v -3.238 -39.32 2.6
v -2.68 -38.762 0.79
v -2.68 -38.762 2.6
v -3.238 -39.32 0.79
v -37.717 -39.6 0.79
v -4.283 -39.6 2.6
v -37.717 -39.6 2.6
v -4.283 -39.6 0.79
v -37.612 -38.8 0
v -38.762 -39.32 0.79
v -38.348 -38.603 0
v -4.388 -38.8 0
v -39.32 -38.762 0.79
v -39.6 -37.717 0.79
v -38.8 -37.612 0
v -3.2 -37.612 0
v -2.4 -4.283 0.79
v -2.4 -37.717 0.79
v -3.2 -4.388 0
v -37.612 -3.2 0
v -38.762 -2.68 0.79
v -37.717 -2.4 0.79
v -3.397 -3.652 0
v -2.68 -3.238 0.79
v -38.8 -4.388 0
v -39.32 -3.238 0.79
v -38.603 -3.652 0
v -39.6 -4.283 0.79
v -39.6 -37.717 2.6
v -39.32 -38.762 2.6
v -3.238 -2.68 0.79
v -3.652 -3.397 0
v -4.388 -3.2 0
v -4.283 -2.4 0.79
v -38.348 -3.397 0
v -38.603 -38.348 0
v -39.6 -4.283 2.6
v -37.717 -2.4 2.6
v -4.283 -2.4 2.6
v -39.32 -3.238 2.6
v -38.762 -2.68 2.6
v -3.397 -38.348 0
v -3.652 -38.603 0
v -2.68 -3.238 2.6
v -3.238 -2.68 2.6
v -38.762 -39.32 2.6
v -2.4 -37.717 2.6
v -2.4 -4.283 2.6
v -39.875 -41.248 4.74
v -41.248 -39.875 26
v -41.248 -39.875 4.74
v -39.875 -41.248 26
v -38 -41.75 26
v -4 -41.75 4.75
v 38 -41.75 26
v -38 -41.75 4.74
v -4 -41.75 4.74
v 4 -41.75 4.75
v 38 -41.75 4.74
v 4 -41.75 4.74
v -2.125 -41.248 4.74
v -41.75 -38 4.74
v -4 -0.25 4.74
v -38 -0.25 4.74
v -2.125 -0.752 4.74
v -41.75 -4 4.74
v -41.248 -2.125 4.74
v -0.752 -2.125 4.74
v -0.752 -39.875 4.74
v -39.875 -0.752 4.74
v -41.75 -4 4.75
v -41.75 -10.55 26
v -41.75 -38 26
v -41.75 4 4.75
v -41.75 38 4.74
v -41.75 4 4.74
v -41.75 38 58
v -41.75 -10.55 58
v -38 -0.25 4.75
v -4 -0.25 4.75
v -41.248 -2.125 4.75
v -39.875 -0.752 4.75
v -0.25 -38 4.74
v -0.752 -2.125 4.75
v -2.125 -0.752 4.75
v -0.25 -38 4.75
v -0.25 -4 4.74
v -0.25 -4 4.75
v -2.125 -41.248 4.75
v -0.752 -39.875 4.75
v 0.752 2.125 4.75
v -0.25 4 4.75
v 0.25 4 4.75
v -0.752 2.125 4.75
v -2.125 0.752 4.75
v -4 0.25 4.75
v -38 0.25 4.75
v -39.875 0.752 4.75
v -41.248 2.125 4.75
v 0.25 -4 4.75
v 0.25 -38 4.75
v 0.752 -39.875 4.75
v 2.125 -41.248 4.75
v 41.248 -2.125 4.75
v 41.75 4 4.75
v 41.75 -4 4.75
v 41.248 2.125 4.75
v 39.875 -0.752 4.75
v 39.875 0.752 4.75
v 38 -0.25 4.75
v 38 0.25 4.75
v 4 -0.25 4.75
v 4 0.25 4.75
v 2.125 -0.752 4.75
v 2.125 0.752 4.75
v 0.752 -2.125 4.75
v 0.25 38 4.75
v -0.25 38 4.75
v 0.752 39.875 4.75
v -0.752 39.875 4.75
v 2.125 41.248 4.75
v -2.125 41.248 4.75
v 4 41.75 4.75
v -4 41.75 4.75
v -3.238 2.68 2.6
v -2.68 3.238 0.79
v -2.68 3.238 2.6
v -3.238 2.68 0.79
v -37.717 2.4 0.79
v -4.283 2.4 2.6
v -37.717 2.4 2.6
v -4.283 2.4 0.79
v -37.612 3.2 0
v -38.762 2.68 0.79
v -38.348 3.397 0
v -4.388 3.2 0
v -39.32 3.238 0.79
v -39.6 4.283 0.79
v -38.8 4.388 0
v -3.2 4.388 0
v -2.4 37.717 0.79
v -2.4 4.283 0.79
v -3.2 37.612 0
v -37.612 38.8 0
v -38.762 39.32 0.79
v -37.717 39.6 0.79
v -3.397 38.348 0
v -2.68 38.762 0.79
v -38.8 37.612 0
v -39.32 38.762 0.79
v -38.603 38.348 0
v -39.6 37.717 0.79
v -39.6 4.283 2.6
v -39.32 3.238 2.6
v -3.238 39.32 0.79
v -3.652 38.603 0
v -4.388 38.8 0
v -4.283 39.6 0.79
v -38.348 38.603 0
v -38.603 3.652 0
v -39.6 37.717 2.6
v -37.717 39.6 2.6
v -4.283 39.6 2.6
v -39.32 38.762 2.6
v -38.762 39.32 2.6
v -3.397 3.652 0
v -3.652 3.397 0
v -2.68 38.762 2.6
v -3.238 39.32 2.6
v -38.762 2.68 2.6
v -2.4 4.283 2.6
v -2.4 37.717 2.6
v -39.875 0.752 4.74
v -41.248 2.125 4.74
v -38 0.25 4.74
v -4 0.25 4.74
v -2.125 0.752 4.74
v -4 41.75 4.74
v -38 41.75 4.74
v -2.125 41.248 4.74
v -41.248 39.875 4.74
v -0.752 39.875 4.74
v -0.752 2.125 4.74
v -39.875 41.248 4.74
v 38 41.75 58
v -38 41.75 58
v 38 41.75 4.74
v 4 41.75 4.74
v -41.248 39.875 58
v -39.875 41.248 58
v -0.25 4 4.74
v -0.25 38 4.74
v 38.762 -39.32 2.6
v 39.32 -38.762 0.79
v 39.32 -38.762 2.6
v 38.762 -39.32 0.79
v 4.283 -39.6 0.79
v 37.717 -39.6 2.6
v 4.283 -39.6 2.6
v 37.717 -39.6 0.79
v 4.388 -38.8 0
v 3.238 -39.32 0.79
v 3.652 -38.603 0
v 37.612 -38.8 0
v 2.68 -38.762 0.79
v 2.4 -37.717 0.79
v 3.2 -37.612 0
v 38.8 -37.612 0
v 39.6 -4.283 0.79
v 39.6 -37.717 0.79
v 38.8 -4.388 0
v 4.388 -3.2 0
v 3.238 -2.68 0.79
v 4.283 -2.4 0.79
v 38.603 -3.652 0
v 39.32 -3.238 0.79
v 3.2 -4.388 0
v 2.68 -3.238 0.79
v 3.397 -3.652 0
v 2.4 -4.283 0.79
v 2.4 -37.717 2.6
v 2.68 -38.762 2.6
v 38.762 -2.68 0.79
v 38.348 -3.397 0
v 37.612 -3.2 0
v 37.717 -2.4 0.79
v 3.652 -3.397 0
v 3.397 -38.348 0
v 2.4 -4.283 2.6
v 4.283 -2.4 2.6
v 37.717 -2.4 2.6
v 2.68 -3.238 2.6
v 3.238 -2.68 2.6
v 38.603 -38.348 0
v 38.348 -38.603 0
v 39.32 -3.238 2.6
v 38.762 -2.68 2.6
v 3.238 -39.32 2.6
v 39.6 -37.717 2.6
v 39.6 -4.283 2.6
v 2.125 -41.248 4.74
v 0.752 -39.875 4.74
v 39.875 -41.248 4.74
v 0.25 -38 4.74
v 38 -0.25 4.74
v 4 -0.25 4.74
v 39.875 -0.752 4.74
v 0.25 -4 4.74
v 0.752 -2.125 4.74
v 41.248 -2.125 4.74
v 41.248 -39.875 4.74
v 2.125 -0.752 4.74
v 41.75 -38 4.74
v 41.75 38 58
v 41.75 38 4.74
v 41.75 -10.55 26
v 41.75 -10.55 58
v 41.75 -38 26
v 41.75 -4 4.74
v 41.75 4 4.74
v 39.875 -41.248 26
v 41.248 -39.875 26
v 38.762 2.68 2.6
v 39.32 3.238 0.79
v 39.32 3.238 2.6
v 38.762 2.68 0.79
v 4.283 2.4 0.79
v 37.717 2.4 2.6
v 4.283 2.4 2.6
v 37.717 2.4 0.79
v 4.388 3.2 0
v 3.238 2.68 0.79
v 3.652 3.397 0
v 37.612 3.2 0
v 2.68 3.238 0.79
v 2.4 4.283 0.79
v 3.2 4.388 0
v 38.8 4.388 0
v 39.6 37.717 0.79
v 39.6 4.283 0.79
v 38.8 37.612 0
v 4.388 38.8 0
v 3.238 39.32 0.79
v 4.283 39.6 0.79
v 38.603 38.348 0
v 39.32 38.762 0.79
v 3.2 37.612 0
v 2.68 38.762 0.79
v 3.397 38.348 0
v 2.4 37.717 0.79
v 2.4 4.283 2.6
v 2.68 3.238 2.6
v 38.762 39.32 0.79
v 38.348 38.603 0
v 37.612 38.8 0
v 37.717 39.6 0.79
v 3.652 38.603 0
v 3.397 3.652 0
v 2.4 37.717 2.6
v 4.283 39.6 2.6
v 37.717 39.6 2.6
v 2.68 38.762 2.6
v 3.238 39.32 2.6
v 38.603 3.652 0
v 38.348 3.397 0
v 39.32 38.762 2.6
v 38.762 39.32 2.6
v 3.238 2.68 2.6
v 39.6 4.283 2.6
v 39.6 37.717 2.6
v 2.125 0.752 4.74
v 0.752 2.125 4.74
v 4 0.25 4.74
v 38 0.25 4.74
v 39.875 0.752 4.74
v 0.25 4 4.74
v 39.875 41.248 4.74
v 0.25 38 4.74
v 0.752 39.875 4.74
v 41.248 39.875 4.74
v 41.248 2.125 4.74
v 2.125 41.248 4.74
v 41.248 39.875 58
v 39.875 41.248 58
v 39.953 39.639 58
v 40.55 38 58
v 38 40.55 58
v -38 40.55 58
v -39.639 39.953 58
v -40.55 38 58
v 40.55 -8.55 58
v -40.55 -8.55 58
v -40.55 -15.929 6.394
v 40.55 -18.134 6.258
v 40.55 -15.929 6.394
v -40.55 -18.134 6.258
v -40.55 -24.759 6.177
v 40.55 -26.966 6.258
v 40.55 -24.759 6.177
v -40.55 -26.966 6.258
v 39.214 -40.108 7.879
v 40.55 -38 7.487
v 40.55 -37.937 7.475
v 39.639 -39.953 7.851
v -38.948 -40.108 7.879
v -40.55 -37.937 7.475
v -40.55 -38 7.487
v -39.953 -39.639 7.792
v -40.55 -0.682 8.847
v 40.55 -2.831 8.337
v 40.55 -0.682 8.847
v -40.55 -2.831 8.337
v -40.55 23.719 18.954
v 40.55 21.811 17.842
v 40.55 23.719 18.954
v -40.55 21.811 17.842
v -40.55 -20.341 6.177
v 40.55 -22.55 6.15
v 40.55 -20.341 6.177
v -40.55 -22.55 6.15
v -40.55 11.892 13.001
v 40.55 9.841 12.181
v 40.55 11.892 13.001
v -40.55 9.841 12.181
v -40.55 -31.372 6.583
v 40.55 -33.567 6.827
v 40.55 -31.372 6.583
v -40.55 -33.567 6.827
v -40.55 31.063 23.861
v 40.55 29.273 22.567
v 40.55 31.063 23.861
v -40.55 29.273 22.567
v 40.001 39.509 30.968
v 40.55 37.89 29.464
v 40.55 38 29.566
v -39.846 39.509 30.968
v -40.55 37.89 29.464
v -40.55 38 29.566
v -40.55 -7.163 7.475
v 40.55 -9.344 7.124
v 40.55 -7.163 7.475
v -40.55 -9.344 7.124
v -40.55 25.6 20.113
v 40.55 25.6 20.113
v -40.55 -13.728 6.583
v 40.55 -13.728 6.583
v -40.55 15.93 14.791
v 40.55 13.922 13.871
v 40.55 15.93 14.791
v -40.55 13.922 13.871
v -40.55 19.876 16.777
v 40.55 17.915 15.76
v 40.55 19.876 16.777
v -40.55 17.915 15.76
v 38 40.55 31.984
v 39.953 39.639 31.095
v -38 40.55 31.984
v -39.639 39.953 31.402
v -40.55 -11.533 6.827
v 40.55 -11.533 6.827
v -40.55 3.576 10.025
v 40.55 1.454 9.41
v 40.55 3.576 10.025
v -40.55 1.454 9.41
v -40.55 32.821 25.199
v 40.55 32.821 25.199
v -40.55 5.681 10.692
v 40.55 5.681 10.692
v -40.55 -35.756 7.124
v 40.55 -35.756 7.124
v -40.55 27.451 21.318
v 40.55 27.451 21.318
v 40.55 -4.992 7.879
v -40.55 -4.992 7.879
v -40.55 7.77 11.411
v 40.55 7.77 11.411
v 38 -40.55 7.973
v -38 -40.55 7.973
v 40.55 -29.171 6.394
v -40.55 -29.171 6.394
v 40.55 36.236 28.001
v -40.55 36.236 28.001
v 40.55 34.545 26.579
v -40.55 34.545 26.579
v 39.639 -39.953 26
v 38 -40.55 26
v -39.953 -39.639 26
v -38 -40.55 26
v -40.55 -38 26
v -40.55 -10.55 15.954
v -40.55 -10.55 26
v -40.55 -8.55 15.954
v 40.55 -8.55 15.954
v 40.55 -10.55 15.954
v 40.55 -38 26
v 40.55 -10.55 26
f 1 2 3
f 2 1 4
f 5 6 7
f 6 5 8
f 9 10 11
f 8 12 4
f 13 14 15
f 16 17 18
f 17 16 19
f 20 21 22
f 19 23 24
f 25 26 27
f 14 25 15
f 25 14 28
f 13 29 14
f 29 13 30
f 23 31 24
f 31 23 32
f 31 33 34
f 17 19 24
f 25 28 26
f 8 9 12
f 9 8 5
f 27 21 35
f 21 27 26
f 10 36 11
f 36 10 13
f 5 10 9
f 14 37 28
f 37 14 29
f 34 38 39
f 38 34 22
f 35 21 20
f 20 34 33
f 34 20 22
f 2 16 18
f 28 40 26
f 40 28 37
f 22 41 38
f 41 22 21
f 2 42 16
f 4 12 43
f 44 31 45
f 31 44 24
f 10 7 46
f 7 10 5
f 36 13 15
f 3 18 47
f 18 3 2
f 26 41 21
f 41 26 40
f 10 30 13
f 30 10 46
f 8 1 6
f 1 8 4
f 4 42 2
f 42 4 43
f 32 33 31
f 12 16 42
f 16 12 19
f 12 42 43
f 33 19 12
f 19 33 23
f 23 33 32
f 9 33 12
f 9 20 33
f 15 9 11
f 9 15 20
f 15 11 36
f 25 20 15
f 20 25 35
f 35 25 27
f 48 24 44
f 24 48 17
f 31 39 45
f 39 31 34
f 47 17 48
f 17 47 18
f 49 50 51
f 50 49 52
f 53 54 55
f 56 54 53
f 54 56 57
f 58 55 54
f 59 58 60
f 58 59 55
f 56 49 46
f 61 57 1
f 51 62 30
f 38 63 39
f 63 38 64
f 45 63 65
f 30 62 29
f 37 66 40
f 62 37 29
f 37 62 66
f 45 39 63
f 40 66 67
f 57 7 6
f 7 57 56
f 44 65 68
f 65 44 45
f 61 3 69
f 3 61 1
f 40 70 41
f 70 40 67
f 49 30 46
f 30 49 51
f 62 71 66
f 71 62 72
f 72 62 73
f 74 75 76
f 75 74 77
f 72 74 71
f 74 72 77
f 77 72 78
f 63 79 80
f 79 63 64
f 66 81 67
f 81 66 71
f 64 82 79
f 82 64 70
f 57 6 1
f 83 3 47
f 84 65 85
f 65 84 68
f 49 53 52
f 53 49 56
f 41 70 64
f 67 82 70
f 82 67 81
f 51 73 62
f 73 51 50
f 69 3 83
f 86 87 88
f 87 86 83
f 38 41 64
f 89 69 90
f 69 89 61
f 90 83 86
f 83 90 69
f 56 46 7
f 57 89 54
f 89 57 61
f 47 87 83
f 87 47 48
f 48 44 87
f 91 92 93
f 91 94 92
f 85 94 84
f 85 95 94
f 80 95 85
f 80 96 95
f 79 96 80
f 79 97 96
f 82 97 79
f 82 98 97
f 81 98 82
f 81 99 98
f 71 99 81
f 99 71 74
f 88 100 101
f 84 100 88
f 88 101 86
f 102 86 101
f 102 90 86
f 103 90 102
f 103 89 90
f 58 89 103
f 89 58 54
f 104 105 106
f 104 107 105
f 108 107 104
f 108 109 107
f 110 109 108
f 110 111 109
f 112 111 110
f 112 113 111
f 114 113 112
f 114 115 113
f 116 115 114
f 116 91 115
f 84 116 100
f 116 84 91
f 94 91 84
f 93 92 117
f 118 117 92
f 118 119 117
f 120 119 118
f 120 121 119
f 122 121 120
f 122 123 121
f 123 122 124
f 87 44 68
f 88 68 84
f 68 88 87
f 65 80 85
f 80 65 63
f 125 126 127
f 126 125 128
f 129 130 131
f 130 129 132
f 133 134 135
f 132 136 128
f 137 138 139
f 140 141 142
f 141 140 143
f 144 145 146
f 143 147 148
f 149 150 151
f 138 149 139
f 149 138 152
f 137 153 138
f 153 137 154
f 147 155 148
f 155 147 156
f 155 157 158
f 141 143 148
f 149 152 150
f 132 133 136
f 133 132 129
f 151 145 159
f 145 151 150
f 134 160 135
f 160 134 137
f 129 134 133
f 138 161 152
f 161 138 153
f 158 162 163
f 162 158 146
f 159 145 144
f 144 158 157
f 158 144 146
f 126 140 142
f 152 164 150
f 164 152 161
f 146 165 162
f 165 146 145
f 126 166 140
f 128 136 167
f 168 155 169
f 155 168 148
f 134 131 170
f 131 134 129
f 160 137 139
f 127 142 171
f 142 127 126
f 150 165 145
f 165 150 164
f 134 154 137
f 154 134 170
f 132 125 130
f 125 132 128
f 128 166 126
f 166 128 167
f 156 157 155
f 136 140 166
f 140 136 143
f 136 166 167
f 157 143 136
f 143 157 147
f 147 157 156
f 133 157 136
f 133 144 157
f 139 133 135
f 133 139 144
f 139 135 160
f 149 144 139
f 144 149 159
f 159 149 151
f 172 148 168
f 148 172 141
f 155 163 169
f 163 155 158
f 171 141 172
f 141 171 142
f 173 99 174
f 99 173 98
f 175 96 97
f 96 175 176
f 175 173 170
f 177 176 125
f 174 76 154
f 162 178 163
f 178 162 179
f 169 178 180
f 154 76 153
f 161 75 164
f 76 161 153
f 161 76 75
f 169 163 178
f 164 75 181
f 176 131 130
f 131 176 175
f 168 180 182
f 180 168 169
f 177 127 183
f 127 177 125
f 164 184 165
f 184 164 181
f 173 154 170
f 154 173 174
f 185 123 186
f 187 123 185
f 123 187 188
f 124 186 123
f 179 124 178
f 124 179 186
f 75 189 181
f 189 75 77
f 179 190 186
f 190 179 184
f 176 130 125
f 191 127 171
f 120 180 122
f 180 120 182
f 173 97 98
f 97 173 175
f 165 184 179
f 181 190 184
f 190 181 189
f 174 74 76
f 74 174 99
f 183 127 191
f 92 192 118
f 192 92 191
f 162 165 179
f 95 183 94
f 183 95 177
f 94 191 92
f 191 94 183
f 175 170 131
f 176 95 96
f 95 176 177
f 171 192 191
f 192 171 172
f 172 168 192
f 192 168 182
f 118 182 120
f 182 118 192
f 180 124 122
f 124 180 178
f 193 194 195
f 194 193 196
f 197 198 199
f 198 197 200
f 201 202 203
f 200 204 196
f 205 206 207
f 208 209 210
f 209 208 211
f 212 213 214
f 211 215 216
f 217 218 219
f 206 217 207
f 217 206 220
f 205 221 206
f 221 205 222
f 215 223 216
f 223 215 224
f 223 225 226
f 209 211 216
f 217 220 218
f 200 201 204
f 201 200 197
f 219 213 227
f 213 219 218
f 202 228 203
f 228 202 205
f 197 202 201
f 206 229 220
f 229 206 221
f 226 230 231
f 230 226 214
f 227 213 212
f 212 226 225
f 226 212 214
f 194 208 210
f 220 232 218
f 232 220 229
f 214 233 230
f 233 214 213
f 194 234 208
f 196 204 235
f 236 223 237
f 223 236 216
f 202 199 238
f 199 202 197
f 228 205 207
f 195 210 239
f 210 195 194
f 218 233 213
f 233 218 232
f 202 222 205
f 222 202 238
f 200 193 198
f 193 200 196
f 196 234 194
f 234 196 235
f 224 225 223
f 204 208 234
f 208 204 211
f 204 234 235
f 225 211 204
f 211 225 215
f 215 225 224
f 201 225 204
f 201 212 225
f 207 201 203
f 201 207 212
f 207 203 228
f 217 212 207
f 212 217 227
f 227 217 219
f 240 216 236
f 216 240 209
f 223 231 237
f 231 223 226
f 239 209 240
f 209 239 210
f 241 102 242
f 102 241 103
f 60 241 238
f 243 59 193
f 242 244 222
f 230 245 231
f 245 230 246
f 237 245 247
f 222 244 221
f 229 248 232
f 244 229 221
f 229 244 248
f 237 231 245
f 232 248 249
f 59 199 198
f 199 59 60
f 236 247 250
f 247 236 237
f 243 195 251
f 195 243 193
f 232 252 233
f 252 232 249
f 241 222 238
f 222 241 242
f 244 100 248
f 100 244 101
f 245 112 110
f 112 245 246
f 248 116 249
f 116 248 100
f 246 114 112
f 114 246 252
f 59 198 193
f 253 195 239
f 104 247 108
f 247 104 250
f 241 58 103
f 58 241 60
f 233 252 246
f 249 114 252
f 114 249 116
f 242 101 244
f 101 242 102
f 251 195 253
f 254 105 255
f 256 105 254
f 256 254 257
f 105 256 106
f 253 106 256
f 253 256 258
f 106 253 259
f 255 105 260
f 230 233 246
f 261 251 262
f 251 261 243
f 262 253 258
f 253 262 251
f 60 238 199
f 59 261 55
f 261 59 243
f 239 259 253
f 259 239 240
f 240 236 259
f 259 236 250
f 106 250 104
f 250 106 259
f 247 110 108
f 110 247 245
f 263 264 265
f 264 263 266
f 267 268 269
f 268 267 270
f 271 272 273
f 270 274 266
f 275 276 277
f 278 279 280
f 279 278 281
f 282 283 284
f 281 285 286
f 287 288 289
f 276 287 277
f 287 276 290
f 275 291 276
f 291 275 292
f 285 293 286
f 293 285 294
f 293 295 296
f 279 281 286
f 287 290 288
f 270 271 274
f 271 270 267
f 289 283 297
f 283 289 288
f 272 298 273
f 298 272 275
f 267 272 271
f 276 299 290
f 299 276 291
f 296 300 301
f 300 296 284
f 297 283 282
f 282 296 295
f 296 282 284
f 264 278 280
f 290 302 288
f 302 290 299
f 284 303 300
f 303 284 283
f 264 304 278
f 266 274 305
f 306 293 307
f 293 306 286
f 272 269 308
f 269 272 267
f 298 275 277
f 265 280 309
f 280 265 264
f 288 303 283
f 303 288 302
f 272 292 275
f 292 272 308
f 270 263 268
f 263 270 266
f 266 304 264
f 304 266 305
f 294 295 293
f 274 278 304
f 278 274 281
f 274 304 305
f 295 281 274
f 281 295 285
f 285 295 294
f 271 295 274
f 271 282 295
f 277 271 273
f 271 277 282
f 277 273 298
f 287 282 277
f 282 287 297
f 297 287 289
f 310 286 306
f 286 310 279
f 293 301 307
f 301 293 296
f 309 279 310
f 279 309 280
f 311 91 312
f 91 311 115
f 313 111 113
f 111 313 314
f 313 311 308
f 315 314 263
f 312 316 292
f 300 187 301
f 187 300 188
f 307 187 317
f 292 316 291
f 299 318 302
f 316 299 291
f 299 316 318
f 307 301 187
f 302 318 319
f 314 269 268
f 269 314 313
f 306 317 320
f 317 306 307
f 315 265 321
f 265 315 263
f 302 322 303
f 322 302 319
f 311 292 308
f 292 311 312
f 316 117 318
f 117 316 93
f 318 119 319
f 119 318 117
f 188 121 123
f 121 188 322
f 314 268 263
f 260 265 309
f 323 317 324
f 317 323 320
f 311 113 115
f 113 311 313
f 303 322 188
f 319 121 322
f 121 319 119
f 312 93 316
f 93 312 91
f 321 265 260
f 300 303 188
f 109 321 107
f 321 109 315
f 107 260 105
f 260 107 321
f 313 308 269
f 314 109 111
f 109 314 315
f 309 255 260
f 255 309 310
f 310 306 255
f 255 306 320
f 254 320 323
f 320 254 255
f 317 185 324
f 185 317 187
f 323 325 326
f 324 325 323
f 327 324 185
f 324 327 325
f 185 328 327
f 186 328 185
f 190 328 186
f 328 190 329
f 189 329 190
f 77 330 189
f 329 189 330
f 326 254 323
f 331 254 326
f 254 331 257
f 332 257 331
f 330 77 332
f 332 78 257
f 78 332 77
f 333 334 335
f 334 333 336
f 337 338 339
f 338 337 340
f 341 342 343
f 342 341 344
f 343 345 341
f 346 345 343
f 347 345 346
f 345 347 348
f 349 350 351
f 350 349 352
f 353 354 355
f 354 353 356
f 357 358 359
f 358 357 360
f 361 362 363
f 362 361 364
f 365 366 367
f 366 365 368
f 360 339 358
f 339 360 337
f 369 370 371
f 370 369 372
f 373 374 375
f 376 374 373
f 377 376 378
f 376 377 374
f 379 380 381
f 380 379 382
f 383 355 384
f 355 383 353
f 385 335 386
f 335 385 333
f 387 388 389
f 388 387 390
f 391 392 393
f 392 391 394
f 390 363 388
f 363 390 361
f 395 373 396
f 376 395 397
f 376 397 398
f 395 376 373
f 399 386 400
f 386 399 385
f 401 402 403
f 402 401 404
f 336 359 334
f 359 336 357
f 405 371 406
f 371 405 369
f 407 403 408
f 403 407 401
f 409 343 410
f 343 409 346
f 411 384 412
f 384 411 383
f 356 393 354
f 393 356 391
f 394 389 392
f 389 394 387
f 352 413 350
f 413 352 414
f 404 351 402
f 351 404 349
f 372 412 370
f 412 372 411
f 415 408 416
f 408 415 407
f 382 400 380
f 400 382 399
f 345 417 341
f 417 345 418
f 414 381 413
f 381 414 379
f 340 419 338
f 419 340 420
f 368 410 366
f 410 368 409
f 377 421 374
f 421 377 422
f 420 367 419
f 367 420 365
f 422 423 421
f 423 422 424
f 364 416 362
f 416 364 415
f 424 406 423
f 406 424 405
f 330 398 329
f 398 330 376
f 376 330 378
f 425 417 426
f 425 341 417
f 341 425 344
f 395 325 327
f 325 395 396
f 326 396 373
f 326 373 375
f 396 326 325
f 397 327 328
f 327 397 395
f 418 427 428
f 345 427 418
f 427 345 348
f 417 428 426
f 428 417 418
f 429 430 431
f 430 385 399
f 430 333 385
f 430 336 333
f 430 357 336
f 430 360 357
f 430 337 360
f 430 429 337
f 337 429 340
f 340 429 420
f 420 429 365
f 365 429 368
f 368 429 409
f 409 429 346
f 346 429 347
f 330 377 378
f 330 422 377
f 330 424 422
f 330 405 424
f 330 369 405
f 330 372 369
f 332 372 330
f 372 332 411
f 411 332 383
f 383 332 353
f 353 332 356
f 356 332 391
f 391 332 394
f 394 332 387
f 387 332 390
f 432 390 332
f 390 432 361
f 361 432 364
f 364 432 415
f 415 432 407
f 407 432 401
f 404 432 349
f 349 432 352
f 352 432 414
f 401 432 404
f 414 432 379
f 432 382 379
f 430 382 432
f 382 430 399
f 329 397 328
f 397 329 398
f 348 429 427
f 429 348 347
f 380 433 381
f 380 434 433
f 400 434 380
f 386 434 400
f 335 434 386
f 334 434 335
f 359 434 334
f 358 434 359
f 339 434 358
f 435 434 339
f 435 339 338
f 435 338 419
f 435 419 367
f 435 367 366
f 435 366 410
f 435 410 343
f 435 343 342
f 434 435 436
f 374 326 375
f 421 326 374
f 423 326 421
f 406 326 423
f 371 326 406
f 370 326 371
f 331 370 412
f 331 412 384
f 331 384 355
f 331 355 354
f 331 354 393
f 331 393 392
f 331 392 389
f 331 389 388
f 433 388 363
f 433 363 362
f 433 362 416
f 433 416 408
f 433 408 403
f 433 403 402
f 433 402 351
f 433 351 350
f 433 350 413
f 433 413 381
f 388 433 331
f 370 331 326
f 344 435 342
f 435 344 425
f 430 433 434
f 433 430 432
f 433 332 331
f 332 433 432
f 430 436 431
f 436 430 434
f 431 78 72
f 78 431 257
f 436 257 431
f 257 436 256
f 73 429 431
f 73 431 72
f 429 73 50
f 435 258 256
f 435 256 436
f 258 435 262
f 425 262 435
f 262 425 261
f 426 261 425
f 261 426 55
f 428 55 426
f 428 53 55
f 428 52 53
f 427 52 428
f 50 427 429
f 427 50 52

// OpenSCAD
// file: ../lib/vessel.scad
// SPDX-License-Identifier: MIT
// Copyright (c) 2026 Aaron Cupp
//
// vessel.scad — parametric collar cups for bottles, cans, and pen-form tools.
//
// A collar cup is a solid Gridfinity block with cylindrical bores sunk into it.
// It LOCATES a vessel; it does not clamp one. That distinction is the whole
// design: a collar that grips harder than the bin weighs comes out of the
// baseplate with the bottle when you grab it one-handed. Clearance, not
// interference — CLR is per-diameter, not per-side.
//
// Capture depth is roughly a third of the vessel's height. Enough to resist a
// knock (this bench sits under a 180 W fume-extractor intake), not so much that
// you're fishing the bottle out.
//
//   collar_cup(nx, ny, vessel_d, capture_h, …)   — one centred bore
//   collar_cup_multi(nx, ny, bores, capture_h, …) — bores = [[x, y, d], …]
//
// Cord slot: pen-form tools that stand in a cup are usually corded (the HARDELL
// rotary tool takes a barrel jack). Without a slot the lead drapes over the rim
// and levers the tool sideways. `cord_w > 0` cuts a channel from the bore out
// through the wall, open to the top.

include <gridfinity.scad>

CLR      = 1.0;   // bore = vessel_d + CLR. Loose on purpose — see above.
MIN_WALL = 1.2;   // minimum material between two bores, and bore to outer face

// ---- geometry guards ----
// Overlapping bores and bores that break out through the side wall both still
// render as perfectly watertight, 2-manifold meshes — CI cannot tell you the
// part is wrong, only that it is closed. These asserts encode the intent that
// the mesh check can't. Cheap, and they fire at render time rather than on the
// printer.
function _pair_gaps(bores, clr) = [
    for (i = [0 : len(bores)-1], j = [0 : len(bores)-1]) if (i < j)
        norm([bores[i][0]-bores[j][0], bores[i][1]-bores[j][1]])
        - (bores[i][2]+clr)/2 - (bores[j][2]+clr)/2
];
function _edge_gaps(bores, clr, W, D) = [
    for (b = bores) min(W/2 - abs(b[0]) - (b[2]+clr)/2,
                        D/2 - abs(b[1]) - (b[2]+clr)/2)
];

// Multi-bore block. Bores are [x, y, diameter] in mm, relative to the block centre.
module collar_cup_multi(nx, ny, bores, capture_h, floor = 1.4, clr = CLR,
                        cord_w = 0, cord_at = 0, min_wall = MIN_WALL) {
    h = BIN_BASE_H + floor + capture_h;
    e = 0.1;
    W = nx*GF - 0.5; D = ny*GF - 0.5;
    _pg = _pair_gaps(bores, clr);
    _eg = _edge_gaps(bores, clr, W, D);
    assert(len(_pg) == 0 || min(_pg) >= min_wall,
           "collar_cup: bores are too close — they would merge into one pocket");
    assert(min(_eg) >= min_wall,
           "collar_cup: a bore breaches the outer wall — block needs more units");
    difference() {
        bin_blank(nx, ny, h);
        for (b = bores)
            translate([b[0], b[1], BIN_BASE_H + floor])
                cylinder(d = b[2] + clr, h = capture_h + e, $fn = 96);
        // Cord channel: from the first bore outward through the +X wall, open to
        // the rim so the lead drops in from above rather than threading.
        if (cord_w > 0)
            translate([bores[0][0], bores[0][1] - cord_w/2, BIN_BASE_H + floor + cord_at])
                cube([nx*GF, cord_w, h]);
    }
}

// Single centred bore — the common case.
module collar_cup(nx, ny, vessel_d, capture_h, floor = 1.4, clr = CLR,
                  cord_w = 0, cord_at = 0, min_wall = MIN_WALL) {
    collar_cup_multi(nx, ny, [[0, 0, vessel_d]], capture_h, floor, clr,
                     cord_w, cord_at, min_wall);
}

// Evenly spaced row of same-depth bores along X — for a rank of aerosol cans.
// Returns geometry, not a list; pass the diameters and it lays them out on the
// block's centre line.
module collar_cup_row(nx, ny, diameters, capture_h, floor = 1.4, clr = CLR,
                      min_wall = MIN_WALL) {
    n = len(diameters);
    pitch = nx * GF / n;
    collar_cup_multi(nx, ny,
        [for (i = [0 : n-1]) [(i - (n-1)/2) * pitch, 0, diameters[i]]],
        capture_h, floor, clr, 0, 0, min_wall);
}
// file: cleaning_station_common.scad
// cleaning_station_common.scad — shared parameters for the bench cleaning station.
//
// The IPA / contact-cleaner corner of the electronics repair bench. Everything
// here is measured off the actual items with calipers; nothing is a nominal from
// a product page. Diameters carry a per-diameter clearance (lib/vessel.scad CLR),
// not per-side.
//
// This corner sits under a fume-extractor intake, which drives two decisions:
//   * Cups CAPTURE the vessel rather than clamp it — a collar that grips harder
//     than the bin weighs lifts out of the baseplate with the bottle.
//   * Bins stay as low as the job allows. Capture velocity is decided in the
//     first six inches, and a wall of tall bins in front of the hood costs it.
//
// The aerosols are FLAMMABLE and this bench has a 400 °C iron on it. These cups
// are for working cans only; bulk stock belongs away from the hood entirely.
//
// SPDX-License-Identifier: CC-BY-NC-SA-4.0
// Copyright (c) 2026 Aaron Cupp

include <../lib/vessel.scad>

// ---- measured diameters (mm) ----
// DeoxIT bore: taken from the PART, not from a can measurement.
//
// The 2026-08-20 print had three bores — 57.00 / 55.20 / 52.75. The 57.00 fits a
// DeoxIT; 55.20 barely does; 52.75 holds nothing. So 57.00 is a validated bore,
// which beats re-deriving it from a can diameter plus a clearance guess. D5, F5
// and G5 are the same can, so one bore serves all three.
BORE_DEOXIT = 57.00;   // ✅ proven by the printed part

// Freeze spray is a DIFFERENT, LARGER can — 13 mm wider than a DeoxIT, which is
// why it never fitted a shared block.
D_FREEZE_SPRAY = 69.00;   // ✅ measured 2026-08-20 (was 56.00, badly wrong)
FREEZE_CLR     = 2.0;     // [1:0.5:4] -> 71.00 bore
FREEZE_MEASURED = true;

D_DISPENSER    = 53.50;   // 200 ml push-down alcohol pump, square base across flats
D_FLOOD_BOTTLE = 75.50;

// DeoxIT D100 / F100 / G100 concentrate droppers — bare bottles, out of their
// kit boxes. The boxes are a full 2×1 EACH; the three bare bottles share one.
// NOT ROUND — 39 × 20 is a flattened cross-section, not a diameter and a height.
D_DROPPER_L = 39.00;   // measured 2026-08-20, long axis of the footprint
D_DROPPER_W = 20.00;   // measured, short axis
DROPPER_CLR = 1.00;    // per dimension, matching the CLR convention
CAP_DROPPER = 26;      // [8:1:40] capture depth. ⚠️ bottle HEIGHT is unmeasured —
                       //   39 turned out to be a footprint, so the height nobody
                       //   has taken.
                       //   RAISED 15 → 26 on 2026-08-24: at 15 the brushes and
                       //   swabs fell over in their slots. Depth is what resists
                       //   an applicator tipping, and 15 mm of it on a ~100 mm
                       //   brush is almost none. 26 makes the whole block half
                       //   again as tall, which is what was asked for.
                       //   Read the bin_deoxit_droppers header before assuming
                       //   this alone fixes the tipping — it does not.

// ---- melamine sponges (mm) — 3.94 × 2.35 × 0.79 in ----
// Full block as sold. Bulk stock lives in the bag under the desk, ~100 of them;
// none of it competes for grid.
SPONGE_L = 100.1; SPONGE_W = 59.7; SPONGE_T = 20.1;

// WORKING size: a full block is far more sponge than any bench task needs, and
// melamine is consumed by abrasion — quartering one gets four uses out of what
// was one, and the smaller piece reaches between connectors where a 100 mm block
// cannot. Halve across, halve lengthwise.
CUT_L = SPONGE_L / 2;   // 50.05
CUT_W = SPONGE_W / 2;   // 29.85
CUT_T = SPONGE_T;       // 20.1 — unchanged, cuts are through the face

// ---- capture depth ----
// Vessel HEIGHTS were not measured, so this is a judgement call rather than a
// derived third-of-height: 50 mm resists a knock without making the bottles a
// two-handed retrieval. One number to change if the first print feels wrong.
CAPTURE = 50;

// Sponge bin: sponges stand ON EDGE (60 mm tall), ~4 across the 81 mm interior.
// On edge beats flat-stacked — same count in a 68 mm bin instead of a 107 mm one,
// and any sponge can be pinched out rather than peeling off the top of a pile.
// Height is set by a FULL block standing on edge, not a cut one — so one uncut
// block can still ride in the bin as reserve alongside the trimmed pieces.
// Cut pieces are 50 long, which is what lets the footprint drop to 2×2.
SPONGE_BIN_H = SPONGE_W + BIN_BASE_H + 1.4 + 2;   // ≈ 68
// main file
// bin_swabs — 2×2 cotton-bud dispenser: tall hopper behind, low trough in front.
//
// MODELLED ON thing:7165275 (Haaneroth, CC BY-NC-SA), which is the shape that
// actually works. That design is a TALL CLOSED BOX whose front wall doubles as a
// dam, with a LOW SCOOPED TROUGH projecting in front of it. Buds tip into the
// box, roll down a continuous curved floor, pass under the dam, and present in
// the trough where you pinch one out.
//
// WHAT THIS REPLACES, AND WHY IT WAS WRONG. The previous version was a box of
// UNIFORM height with a dish inside it. Every wall stood at 42 mm, so the trough
// was at the bottom of a 36 mm well — you reached down a shaft to find a bud
// instead of picking one off a shelf. It held buds; it did not dispense them,
// and it looked nothing like the reference it was supposedly modelled on.
//
// THE SILHOUETTE IS THE DESIGN. Tall at the back, low at the front:
//
//     back wall      58 mm      hopper — holds the pile
//     dam            58 mm      the hopper's front wall, GAP mm clear at its base
//     front wall     26 mm      low enough to reach over, tall enough to contain
//
// FRONT AND BACK ARE BOTH REAL WALLS. An earlier attempt cut the front to a
// 12 mm lip and buds rolled onto the desk. 26 mm against a trough floor at 7.97
// gives **18 mm of containment** — the trough is a dished shelf you reach into,
// not an opening things escape from.
//
// THE FLOOR IS ONE CONTINUOUS RADIUS, not a ramp meeting a trough. A single
// SCOOP_R means there is no corner anywhere along the path a bud rolls, and it
// runs downhill the whole way rather than having to climb out from under the dam.
//
// PRINT: as emitted, feet down — WITH SUPPORT UNDER THE DAM.
//
// This used to claim the dam "prints unsupported at this span". That is false,
// and it cost a print. The dam's underside is a horizontal ceiling GAP mm above
// the floor, anchored only at its two ends, on a ribbon DAM_T deep:
//
//     3×2   bridges 123.10 mm on 2.0 mm   —  61.5 : 1
//     2×2   bridges  81.10 mm on 2.0 mm   —  40.5 : 1
//
// Nothing bridges 123 mm at 61:1. It sagged into the feed opening and closed it,
// which read as "the swabs are too fat" — they were not.
//
// IT CANNOT BE MADE SELF-SUPPORTING BY ARCHING IT. Swabs lie ACROSS the width
// and roll forward, so the opening has to stay clear for its whole span: no
// pillars, no centre post. An arch steep enough to print (45°) would need its
// apex 40 mm above the ends on the 2×2 — taller than the dam itself.
//
// So: a support enforcer in the feed slot, and check the gap is actually GAP mm
// on the printed part before blaming the swabs.
//
// SPDX-License-Identifier: CC-BY-NC-SA-4.0
// Copyright (c) 2026 Aaron Cupp
include <cleaning_station_common.scad>
include <../lib/gridfinity.scad>

NX = 2; NY = 2;
H         = 58;    // [40:1:90] hopper height — the back wall and the dam
FRONT_H   = 26;    // [16:1:40] front wall. Low enough to reach over, high enough
                   //   to contain: see the 18 mm figure in the header.
TROUGH_D  = 30;    // [20:1:45] front-to-back depth of the trough, dam to front
SCOOP_R   = 90;    // [50:5:200] floor radius. Smaller digs a deeper trough and
                   //   raises the floor at the back; below ~70 the hopper's rear
                   //   floor climbs into the usable volume.
LOW_IN    = 18;    // [8:1:30] where the floor bottoms out, back from the front
DAM_T     = 2.0;   // [1.2:0.2:4] dam thickness
GAP       = 9;     // [5:0.5:16] feed opening under the dam — about one bud
WALL      = 1.2;
FLOOR     = 1.4;
// NO BUD LENGTH IS HARDCODED HERE ANY MORE. This said 81.28 — an assumed 3.2" —
// and MEASUREMENTS.md listed "swab shaft ⌀ + length" as missing the whole time.
// It was a guess driving the assert that decided whether 2×2 was even possible.
//
// What IS known, 2026-09-07: the swabs were dropped into a 2-cell span and fit.
// So they clear an 81.1 mm interior. That is the bound the geometry needs; the
// exact length is still not on calipers and does not need to be.
IW_MIN    = 79.1;  // the 2×2 interior less 2 mm — verified in hand

W = NX*GF - 0.5; D = NY*GF - 0.5;
IW = W - 2*WALL; ID = D - 2*WALL;
Z0 = BIN_BASE_H + FLOOR;

Y_FRONT = -ID/2;
Y_DAM   = Y_FRONT + TROUGH_D;
Y_BACK  = ID/2;
Y_LOW   = Y_FRONT + LOW_IN;

function floor_z(y) = SCOOP_R - sqrt(SCOOP_R*SCOOP_R - pow(y - Y_LOW, 2));

assert(IW >= IW_MIN, str("Interior is ", IW, " mm — swabs were only confirmed to fit ", IW_MIN, "."));
assert(FRONT_H > Z0 + floor_z(Y_FRONT) + 12,
       "Front wall is too low over the trough floor — buds will roll out.");
assert(Z0 + floor_z(Y_BACK) < H - 15, "Floor climbs too far at the back — raise SCOOP_R.");
echo(str("front wall ", FRONT_H, " over a trough floor at ", Z0 + floor_z(Y_FRONT),
         " = ", FRONT_H - Z0 - floor_z(Y_FRONT), " mm of containment; hopper ",
         H - Z0 - floor_z(Y_BACK), " mm usable at the back"));

// EVERY CUT IS CLIPPED TO THIS. bin_blank's interior is a ROUNDED rectangle, and
// a plain cube spanning the full interior runs straight through the corner radii
// and opens all four corners. Two bins shipped and were printed that way before
// anyone looked; tools/validate_stl.py now fails it.
module _interior(h) {
    translate([0, 0, Z0]) linear_extrude(h)
        offset(BIN_R - WALL) offset(-(BIN_R - WALL))
            square([IW, ID], center = true);
}

difference() {
    union() {
        difference() {
            bin_blank(NX, NY, H);
            intersection() {
                union() {
                    // the curved floor, swept across the full width
                    translate([-IW, Y_LOW, Z0 + SCOOP_R])
                        rotate([0, 90, 0]) cylinder(r = SCOOP_R, h = 2*IW, $fn = 256);
                    // everything above it
                    translate([-IW/2, Y_FRONT, Z0 + SCOOP_R]) cube([IW, ID, H]);
                }
                _interior(H);
            }
        }
        // the dam — the hopper's front wall, standing GAP clear of the floor
        translate([-IW/2, Y_DAM, Z0 + floor_z(Y_DAM) + GAP])
            cube([IW, DAM_T, H - Z0 - floor_z(Y_DAM) - GAP]);
    }
    // drop the FRONT wall to FRONT_H — everything ahead of the dam
    translate([-W, Y_FRONT - WALL - 1, FRONT_H])
        cube([2*W, TROUGH_D + WALL + 1, H]);
}
